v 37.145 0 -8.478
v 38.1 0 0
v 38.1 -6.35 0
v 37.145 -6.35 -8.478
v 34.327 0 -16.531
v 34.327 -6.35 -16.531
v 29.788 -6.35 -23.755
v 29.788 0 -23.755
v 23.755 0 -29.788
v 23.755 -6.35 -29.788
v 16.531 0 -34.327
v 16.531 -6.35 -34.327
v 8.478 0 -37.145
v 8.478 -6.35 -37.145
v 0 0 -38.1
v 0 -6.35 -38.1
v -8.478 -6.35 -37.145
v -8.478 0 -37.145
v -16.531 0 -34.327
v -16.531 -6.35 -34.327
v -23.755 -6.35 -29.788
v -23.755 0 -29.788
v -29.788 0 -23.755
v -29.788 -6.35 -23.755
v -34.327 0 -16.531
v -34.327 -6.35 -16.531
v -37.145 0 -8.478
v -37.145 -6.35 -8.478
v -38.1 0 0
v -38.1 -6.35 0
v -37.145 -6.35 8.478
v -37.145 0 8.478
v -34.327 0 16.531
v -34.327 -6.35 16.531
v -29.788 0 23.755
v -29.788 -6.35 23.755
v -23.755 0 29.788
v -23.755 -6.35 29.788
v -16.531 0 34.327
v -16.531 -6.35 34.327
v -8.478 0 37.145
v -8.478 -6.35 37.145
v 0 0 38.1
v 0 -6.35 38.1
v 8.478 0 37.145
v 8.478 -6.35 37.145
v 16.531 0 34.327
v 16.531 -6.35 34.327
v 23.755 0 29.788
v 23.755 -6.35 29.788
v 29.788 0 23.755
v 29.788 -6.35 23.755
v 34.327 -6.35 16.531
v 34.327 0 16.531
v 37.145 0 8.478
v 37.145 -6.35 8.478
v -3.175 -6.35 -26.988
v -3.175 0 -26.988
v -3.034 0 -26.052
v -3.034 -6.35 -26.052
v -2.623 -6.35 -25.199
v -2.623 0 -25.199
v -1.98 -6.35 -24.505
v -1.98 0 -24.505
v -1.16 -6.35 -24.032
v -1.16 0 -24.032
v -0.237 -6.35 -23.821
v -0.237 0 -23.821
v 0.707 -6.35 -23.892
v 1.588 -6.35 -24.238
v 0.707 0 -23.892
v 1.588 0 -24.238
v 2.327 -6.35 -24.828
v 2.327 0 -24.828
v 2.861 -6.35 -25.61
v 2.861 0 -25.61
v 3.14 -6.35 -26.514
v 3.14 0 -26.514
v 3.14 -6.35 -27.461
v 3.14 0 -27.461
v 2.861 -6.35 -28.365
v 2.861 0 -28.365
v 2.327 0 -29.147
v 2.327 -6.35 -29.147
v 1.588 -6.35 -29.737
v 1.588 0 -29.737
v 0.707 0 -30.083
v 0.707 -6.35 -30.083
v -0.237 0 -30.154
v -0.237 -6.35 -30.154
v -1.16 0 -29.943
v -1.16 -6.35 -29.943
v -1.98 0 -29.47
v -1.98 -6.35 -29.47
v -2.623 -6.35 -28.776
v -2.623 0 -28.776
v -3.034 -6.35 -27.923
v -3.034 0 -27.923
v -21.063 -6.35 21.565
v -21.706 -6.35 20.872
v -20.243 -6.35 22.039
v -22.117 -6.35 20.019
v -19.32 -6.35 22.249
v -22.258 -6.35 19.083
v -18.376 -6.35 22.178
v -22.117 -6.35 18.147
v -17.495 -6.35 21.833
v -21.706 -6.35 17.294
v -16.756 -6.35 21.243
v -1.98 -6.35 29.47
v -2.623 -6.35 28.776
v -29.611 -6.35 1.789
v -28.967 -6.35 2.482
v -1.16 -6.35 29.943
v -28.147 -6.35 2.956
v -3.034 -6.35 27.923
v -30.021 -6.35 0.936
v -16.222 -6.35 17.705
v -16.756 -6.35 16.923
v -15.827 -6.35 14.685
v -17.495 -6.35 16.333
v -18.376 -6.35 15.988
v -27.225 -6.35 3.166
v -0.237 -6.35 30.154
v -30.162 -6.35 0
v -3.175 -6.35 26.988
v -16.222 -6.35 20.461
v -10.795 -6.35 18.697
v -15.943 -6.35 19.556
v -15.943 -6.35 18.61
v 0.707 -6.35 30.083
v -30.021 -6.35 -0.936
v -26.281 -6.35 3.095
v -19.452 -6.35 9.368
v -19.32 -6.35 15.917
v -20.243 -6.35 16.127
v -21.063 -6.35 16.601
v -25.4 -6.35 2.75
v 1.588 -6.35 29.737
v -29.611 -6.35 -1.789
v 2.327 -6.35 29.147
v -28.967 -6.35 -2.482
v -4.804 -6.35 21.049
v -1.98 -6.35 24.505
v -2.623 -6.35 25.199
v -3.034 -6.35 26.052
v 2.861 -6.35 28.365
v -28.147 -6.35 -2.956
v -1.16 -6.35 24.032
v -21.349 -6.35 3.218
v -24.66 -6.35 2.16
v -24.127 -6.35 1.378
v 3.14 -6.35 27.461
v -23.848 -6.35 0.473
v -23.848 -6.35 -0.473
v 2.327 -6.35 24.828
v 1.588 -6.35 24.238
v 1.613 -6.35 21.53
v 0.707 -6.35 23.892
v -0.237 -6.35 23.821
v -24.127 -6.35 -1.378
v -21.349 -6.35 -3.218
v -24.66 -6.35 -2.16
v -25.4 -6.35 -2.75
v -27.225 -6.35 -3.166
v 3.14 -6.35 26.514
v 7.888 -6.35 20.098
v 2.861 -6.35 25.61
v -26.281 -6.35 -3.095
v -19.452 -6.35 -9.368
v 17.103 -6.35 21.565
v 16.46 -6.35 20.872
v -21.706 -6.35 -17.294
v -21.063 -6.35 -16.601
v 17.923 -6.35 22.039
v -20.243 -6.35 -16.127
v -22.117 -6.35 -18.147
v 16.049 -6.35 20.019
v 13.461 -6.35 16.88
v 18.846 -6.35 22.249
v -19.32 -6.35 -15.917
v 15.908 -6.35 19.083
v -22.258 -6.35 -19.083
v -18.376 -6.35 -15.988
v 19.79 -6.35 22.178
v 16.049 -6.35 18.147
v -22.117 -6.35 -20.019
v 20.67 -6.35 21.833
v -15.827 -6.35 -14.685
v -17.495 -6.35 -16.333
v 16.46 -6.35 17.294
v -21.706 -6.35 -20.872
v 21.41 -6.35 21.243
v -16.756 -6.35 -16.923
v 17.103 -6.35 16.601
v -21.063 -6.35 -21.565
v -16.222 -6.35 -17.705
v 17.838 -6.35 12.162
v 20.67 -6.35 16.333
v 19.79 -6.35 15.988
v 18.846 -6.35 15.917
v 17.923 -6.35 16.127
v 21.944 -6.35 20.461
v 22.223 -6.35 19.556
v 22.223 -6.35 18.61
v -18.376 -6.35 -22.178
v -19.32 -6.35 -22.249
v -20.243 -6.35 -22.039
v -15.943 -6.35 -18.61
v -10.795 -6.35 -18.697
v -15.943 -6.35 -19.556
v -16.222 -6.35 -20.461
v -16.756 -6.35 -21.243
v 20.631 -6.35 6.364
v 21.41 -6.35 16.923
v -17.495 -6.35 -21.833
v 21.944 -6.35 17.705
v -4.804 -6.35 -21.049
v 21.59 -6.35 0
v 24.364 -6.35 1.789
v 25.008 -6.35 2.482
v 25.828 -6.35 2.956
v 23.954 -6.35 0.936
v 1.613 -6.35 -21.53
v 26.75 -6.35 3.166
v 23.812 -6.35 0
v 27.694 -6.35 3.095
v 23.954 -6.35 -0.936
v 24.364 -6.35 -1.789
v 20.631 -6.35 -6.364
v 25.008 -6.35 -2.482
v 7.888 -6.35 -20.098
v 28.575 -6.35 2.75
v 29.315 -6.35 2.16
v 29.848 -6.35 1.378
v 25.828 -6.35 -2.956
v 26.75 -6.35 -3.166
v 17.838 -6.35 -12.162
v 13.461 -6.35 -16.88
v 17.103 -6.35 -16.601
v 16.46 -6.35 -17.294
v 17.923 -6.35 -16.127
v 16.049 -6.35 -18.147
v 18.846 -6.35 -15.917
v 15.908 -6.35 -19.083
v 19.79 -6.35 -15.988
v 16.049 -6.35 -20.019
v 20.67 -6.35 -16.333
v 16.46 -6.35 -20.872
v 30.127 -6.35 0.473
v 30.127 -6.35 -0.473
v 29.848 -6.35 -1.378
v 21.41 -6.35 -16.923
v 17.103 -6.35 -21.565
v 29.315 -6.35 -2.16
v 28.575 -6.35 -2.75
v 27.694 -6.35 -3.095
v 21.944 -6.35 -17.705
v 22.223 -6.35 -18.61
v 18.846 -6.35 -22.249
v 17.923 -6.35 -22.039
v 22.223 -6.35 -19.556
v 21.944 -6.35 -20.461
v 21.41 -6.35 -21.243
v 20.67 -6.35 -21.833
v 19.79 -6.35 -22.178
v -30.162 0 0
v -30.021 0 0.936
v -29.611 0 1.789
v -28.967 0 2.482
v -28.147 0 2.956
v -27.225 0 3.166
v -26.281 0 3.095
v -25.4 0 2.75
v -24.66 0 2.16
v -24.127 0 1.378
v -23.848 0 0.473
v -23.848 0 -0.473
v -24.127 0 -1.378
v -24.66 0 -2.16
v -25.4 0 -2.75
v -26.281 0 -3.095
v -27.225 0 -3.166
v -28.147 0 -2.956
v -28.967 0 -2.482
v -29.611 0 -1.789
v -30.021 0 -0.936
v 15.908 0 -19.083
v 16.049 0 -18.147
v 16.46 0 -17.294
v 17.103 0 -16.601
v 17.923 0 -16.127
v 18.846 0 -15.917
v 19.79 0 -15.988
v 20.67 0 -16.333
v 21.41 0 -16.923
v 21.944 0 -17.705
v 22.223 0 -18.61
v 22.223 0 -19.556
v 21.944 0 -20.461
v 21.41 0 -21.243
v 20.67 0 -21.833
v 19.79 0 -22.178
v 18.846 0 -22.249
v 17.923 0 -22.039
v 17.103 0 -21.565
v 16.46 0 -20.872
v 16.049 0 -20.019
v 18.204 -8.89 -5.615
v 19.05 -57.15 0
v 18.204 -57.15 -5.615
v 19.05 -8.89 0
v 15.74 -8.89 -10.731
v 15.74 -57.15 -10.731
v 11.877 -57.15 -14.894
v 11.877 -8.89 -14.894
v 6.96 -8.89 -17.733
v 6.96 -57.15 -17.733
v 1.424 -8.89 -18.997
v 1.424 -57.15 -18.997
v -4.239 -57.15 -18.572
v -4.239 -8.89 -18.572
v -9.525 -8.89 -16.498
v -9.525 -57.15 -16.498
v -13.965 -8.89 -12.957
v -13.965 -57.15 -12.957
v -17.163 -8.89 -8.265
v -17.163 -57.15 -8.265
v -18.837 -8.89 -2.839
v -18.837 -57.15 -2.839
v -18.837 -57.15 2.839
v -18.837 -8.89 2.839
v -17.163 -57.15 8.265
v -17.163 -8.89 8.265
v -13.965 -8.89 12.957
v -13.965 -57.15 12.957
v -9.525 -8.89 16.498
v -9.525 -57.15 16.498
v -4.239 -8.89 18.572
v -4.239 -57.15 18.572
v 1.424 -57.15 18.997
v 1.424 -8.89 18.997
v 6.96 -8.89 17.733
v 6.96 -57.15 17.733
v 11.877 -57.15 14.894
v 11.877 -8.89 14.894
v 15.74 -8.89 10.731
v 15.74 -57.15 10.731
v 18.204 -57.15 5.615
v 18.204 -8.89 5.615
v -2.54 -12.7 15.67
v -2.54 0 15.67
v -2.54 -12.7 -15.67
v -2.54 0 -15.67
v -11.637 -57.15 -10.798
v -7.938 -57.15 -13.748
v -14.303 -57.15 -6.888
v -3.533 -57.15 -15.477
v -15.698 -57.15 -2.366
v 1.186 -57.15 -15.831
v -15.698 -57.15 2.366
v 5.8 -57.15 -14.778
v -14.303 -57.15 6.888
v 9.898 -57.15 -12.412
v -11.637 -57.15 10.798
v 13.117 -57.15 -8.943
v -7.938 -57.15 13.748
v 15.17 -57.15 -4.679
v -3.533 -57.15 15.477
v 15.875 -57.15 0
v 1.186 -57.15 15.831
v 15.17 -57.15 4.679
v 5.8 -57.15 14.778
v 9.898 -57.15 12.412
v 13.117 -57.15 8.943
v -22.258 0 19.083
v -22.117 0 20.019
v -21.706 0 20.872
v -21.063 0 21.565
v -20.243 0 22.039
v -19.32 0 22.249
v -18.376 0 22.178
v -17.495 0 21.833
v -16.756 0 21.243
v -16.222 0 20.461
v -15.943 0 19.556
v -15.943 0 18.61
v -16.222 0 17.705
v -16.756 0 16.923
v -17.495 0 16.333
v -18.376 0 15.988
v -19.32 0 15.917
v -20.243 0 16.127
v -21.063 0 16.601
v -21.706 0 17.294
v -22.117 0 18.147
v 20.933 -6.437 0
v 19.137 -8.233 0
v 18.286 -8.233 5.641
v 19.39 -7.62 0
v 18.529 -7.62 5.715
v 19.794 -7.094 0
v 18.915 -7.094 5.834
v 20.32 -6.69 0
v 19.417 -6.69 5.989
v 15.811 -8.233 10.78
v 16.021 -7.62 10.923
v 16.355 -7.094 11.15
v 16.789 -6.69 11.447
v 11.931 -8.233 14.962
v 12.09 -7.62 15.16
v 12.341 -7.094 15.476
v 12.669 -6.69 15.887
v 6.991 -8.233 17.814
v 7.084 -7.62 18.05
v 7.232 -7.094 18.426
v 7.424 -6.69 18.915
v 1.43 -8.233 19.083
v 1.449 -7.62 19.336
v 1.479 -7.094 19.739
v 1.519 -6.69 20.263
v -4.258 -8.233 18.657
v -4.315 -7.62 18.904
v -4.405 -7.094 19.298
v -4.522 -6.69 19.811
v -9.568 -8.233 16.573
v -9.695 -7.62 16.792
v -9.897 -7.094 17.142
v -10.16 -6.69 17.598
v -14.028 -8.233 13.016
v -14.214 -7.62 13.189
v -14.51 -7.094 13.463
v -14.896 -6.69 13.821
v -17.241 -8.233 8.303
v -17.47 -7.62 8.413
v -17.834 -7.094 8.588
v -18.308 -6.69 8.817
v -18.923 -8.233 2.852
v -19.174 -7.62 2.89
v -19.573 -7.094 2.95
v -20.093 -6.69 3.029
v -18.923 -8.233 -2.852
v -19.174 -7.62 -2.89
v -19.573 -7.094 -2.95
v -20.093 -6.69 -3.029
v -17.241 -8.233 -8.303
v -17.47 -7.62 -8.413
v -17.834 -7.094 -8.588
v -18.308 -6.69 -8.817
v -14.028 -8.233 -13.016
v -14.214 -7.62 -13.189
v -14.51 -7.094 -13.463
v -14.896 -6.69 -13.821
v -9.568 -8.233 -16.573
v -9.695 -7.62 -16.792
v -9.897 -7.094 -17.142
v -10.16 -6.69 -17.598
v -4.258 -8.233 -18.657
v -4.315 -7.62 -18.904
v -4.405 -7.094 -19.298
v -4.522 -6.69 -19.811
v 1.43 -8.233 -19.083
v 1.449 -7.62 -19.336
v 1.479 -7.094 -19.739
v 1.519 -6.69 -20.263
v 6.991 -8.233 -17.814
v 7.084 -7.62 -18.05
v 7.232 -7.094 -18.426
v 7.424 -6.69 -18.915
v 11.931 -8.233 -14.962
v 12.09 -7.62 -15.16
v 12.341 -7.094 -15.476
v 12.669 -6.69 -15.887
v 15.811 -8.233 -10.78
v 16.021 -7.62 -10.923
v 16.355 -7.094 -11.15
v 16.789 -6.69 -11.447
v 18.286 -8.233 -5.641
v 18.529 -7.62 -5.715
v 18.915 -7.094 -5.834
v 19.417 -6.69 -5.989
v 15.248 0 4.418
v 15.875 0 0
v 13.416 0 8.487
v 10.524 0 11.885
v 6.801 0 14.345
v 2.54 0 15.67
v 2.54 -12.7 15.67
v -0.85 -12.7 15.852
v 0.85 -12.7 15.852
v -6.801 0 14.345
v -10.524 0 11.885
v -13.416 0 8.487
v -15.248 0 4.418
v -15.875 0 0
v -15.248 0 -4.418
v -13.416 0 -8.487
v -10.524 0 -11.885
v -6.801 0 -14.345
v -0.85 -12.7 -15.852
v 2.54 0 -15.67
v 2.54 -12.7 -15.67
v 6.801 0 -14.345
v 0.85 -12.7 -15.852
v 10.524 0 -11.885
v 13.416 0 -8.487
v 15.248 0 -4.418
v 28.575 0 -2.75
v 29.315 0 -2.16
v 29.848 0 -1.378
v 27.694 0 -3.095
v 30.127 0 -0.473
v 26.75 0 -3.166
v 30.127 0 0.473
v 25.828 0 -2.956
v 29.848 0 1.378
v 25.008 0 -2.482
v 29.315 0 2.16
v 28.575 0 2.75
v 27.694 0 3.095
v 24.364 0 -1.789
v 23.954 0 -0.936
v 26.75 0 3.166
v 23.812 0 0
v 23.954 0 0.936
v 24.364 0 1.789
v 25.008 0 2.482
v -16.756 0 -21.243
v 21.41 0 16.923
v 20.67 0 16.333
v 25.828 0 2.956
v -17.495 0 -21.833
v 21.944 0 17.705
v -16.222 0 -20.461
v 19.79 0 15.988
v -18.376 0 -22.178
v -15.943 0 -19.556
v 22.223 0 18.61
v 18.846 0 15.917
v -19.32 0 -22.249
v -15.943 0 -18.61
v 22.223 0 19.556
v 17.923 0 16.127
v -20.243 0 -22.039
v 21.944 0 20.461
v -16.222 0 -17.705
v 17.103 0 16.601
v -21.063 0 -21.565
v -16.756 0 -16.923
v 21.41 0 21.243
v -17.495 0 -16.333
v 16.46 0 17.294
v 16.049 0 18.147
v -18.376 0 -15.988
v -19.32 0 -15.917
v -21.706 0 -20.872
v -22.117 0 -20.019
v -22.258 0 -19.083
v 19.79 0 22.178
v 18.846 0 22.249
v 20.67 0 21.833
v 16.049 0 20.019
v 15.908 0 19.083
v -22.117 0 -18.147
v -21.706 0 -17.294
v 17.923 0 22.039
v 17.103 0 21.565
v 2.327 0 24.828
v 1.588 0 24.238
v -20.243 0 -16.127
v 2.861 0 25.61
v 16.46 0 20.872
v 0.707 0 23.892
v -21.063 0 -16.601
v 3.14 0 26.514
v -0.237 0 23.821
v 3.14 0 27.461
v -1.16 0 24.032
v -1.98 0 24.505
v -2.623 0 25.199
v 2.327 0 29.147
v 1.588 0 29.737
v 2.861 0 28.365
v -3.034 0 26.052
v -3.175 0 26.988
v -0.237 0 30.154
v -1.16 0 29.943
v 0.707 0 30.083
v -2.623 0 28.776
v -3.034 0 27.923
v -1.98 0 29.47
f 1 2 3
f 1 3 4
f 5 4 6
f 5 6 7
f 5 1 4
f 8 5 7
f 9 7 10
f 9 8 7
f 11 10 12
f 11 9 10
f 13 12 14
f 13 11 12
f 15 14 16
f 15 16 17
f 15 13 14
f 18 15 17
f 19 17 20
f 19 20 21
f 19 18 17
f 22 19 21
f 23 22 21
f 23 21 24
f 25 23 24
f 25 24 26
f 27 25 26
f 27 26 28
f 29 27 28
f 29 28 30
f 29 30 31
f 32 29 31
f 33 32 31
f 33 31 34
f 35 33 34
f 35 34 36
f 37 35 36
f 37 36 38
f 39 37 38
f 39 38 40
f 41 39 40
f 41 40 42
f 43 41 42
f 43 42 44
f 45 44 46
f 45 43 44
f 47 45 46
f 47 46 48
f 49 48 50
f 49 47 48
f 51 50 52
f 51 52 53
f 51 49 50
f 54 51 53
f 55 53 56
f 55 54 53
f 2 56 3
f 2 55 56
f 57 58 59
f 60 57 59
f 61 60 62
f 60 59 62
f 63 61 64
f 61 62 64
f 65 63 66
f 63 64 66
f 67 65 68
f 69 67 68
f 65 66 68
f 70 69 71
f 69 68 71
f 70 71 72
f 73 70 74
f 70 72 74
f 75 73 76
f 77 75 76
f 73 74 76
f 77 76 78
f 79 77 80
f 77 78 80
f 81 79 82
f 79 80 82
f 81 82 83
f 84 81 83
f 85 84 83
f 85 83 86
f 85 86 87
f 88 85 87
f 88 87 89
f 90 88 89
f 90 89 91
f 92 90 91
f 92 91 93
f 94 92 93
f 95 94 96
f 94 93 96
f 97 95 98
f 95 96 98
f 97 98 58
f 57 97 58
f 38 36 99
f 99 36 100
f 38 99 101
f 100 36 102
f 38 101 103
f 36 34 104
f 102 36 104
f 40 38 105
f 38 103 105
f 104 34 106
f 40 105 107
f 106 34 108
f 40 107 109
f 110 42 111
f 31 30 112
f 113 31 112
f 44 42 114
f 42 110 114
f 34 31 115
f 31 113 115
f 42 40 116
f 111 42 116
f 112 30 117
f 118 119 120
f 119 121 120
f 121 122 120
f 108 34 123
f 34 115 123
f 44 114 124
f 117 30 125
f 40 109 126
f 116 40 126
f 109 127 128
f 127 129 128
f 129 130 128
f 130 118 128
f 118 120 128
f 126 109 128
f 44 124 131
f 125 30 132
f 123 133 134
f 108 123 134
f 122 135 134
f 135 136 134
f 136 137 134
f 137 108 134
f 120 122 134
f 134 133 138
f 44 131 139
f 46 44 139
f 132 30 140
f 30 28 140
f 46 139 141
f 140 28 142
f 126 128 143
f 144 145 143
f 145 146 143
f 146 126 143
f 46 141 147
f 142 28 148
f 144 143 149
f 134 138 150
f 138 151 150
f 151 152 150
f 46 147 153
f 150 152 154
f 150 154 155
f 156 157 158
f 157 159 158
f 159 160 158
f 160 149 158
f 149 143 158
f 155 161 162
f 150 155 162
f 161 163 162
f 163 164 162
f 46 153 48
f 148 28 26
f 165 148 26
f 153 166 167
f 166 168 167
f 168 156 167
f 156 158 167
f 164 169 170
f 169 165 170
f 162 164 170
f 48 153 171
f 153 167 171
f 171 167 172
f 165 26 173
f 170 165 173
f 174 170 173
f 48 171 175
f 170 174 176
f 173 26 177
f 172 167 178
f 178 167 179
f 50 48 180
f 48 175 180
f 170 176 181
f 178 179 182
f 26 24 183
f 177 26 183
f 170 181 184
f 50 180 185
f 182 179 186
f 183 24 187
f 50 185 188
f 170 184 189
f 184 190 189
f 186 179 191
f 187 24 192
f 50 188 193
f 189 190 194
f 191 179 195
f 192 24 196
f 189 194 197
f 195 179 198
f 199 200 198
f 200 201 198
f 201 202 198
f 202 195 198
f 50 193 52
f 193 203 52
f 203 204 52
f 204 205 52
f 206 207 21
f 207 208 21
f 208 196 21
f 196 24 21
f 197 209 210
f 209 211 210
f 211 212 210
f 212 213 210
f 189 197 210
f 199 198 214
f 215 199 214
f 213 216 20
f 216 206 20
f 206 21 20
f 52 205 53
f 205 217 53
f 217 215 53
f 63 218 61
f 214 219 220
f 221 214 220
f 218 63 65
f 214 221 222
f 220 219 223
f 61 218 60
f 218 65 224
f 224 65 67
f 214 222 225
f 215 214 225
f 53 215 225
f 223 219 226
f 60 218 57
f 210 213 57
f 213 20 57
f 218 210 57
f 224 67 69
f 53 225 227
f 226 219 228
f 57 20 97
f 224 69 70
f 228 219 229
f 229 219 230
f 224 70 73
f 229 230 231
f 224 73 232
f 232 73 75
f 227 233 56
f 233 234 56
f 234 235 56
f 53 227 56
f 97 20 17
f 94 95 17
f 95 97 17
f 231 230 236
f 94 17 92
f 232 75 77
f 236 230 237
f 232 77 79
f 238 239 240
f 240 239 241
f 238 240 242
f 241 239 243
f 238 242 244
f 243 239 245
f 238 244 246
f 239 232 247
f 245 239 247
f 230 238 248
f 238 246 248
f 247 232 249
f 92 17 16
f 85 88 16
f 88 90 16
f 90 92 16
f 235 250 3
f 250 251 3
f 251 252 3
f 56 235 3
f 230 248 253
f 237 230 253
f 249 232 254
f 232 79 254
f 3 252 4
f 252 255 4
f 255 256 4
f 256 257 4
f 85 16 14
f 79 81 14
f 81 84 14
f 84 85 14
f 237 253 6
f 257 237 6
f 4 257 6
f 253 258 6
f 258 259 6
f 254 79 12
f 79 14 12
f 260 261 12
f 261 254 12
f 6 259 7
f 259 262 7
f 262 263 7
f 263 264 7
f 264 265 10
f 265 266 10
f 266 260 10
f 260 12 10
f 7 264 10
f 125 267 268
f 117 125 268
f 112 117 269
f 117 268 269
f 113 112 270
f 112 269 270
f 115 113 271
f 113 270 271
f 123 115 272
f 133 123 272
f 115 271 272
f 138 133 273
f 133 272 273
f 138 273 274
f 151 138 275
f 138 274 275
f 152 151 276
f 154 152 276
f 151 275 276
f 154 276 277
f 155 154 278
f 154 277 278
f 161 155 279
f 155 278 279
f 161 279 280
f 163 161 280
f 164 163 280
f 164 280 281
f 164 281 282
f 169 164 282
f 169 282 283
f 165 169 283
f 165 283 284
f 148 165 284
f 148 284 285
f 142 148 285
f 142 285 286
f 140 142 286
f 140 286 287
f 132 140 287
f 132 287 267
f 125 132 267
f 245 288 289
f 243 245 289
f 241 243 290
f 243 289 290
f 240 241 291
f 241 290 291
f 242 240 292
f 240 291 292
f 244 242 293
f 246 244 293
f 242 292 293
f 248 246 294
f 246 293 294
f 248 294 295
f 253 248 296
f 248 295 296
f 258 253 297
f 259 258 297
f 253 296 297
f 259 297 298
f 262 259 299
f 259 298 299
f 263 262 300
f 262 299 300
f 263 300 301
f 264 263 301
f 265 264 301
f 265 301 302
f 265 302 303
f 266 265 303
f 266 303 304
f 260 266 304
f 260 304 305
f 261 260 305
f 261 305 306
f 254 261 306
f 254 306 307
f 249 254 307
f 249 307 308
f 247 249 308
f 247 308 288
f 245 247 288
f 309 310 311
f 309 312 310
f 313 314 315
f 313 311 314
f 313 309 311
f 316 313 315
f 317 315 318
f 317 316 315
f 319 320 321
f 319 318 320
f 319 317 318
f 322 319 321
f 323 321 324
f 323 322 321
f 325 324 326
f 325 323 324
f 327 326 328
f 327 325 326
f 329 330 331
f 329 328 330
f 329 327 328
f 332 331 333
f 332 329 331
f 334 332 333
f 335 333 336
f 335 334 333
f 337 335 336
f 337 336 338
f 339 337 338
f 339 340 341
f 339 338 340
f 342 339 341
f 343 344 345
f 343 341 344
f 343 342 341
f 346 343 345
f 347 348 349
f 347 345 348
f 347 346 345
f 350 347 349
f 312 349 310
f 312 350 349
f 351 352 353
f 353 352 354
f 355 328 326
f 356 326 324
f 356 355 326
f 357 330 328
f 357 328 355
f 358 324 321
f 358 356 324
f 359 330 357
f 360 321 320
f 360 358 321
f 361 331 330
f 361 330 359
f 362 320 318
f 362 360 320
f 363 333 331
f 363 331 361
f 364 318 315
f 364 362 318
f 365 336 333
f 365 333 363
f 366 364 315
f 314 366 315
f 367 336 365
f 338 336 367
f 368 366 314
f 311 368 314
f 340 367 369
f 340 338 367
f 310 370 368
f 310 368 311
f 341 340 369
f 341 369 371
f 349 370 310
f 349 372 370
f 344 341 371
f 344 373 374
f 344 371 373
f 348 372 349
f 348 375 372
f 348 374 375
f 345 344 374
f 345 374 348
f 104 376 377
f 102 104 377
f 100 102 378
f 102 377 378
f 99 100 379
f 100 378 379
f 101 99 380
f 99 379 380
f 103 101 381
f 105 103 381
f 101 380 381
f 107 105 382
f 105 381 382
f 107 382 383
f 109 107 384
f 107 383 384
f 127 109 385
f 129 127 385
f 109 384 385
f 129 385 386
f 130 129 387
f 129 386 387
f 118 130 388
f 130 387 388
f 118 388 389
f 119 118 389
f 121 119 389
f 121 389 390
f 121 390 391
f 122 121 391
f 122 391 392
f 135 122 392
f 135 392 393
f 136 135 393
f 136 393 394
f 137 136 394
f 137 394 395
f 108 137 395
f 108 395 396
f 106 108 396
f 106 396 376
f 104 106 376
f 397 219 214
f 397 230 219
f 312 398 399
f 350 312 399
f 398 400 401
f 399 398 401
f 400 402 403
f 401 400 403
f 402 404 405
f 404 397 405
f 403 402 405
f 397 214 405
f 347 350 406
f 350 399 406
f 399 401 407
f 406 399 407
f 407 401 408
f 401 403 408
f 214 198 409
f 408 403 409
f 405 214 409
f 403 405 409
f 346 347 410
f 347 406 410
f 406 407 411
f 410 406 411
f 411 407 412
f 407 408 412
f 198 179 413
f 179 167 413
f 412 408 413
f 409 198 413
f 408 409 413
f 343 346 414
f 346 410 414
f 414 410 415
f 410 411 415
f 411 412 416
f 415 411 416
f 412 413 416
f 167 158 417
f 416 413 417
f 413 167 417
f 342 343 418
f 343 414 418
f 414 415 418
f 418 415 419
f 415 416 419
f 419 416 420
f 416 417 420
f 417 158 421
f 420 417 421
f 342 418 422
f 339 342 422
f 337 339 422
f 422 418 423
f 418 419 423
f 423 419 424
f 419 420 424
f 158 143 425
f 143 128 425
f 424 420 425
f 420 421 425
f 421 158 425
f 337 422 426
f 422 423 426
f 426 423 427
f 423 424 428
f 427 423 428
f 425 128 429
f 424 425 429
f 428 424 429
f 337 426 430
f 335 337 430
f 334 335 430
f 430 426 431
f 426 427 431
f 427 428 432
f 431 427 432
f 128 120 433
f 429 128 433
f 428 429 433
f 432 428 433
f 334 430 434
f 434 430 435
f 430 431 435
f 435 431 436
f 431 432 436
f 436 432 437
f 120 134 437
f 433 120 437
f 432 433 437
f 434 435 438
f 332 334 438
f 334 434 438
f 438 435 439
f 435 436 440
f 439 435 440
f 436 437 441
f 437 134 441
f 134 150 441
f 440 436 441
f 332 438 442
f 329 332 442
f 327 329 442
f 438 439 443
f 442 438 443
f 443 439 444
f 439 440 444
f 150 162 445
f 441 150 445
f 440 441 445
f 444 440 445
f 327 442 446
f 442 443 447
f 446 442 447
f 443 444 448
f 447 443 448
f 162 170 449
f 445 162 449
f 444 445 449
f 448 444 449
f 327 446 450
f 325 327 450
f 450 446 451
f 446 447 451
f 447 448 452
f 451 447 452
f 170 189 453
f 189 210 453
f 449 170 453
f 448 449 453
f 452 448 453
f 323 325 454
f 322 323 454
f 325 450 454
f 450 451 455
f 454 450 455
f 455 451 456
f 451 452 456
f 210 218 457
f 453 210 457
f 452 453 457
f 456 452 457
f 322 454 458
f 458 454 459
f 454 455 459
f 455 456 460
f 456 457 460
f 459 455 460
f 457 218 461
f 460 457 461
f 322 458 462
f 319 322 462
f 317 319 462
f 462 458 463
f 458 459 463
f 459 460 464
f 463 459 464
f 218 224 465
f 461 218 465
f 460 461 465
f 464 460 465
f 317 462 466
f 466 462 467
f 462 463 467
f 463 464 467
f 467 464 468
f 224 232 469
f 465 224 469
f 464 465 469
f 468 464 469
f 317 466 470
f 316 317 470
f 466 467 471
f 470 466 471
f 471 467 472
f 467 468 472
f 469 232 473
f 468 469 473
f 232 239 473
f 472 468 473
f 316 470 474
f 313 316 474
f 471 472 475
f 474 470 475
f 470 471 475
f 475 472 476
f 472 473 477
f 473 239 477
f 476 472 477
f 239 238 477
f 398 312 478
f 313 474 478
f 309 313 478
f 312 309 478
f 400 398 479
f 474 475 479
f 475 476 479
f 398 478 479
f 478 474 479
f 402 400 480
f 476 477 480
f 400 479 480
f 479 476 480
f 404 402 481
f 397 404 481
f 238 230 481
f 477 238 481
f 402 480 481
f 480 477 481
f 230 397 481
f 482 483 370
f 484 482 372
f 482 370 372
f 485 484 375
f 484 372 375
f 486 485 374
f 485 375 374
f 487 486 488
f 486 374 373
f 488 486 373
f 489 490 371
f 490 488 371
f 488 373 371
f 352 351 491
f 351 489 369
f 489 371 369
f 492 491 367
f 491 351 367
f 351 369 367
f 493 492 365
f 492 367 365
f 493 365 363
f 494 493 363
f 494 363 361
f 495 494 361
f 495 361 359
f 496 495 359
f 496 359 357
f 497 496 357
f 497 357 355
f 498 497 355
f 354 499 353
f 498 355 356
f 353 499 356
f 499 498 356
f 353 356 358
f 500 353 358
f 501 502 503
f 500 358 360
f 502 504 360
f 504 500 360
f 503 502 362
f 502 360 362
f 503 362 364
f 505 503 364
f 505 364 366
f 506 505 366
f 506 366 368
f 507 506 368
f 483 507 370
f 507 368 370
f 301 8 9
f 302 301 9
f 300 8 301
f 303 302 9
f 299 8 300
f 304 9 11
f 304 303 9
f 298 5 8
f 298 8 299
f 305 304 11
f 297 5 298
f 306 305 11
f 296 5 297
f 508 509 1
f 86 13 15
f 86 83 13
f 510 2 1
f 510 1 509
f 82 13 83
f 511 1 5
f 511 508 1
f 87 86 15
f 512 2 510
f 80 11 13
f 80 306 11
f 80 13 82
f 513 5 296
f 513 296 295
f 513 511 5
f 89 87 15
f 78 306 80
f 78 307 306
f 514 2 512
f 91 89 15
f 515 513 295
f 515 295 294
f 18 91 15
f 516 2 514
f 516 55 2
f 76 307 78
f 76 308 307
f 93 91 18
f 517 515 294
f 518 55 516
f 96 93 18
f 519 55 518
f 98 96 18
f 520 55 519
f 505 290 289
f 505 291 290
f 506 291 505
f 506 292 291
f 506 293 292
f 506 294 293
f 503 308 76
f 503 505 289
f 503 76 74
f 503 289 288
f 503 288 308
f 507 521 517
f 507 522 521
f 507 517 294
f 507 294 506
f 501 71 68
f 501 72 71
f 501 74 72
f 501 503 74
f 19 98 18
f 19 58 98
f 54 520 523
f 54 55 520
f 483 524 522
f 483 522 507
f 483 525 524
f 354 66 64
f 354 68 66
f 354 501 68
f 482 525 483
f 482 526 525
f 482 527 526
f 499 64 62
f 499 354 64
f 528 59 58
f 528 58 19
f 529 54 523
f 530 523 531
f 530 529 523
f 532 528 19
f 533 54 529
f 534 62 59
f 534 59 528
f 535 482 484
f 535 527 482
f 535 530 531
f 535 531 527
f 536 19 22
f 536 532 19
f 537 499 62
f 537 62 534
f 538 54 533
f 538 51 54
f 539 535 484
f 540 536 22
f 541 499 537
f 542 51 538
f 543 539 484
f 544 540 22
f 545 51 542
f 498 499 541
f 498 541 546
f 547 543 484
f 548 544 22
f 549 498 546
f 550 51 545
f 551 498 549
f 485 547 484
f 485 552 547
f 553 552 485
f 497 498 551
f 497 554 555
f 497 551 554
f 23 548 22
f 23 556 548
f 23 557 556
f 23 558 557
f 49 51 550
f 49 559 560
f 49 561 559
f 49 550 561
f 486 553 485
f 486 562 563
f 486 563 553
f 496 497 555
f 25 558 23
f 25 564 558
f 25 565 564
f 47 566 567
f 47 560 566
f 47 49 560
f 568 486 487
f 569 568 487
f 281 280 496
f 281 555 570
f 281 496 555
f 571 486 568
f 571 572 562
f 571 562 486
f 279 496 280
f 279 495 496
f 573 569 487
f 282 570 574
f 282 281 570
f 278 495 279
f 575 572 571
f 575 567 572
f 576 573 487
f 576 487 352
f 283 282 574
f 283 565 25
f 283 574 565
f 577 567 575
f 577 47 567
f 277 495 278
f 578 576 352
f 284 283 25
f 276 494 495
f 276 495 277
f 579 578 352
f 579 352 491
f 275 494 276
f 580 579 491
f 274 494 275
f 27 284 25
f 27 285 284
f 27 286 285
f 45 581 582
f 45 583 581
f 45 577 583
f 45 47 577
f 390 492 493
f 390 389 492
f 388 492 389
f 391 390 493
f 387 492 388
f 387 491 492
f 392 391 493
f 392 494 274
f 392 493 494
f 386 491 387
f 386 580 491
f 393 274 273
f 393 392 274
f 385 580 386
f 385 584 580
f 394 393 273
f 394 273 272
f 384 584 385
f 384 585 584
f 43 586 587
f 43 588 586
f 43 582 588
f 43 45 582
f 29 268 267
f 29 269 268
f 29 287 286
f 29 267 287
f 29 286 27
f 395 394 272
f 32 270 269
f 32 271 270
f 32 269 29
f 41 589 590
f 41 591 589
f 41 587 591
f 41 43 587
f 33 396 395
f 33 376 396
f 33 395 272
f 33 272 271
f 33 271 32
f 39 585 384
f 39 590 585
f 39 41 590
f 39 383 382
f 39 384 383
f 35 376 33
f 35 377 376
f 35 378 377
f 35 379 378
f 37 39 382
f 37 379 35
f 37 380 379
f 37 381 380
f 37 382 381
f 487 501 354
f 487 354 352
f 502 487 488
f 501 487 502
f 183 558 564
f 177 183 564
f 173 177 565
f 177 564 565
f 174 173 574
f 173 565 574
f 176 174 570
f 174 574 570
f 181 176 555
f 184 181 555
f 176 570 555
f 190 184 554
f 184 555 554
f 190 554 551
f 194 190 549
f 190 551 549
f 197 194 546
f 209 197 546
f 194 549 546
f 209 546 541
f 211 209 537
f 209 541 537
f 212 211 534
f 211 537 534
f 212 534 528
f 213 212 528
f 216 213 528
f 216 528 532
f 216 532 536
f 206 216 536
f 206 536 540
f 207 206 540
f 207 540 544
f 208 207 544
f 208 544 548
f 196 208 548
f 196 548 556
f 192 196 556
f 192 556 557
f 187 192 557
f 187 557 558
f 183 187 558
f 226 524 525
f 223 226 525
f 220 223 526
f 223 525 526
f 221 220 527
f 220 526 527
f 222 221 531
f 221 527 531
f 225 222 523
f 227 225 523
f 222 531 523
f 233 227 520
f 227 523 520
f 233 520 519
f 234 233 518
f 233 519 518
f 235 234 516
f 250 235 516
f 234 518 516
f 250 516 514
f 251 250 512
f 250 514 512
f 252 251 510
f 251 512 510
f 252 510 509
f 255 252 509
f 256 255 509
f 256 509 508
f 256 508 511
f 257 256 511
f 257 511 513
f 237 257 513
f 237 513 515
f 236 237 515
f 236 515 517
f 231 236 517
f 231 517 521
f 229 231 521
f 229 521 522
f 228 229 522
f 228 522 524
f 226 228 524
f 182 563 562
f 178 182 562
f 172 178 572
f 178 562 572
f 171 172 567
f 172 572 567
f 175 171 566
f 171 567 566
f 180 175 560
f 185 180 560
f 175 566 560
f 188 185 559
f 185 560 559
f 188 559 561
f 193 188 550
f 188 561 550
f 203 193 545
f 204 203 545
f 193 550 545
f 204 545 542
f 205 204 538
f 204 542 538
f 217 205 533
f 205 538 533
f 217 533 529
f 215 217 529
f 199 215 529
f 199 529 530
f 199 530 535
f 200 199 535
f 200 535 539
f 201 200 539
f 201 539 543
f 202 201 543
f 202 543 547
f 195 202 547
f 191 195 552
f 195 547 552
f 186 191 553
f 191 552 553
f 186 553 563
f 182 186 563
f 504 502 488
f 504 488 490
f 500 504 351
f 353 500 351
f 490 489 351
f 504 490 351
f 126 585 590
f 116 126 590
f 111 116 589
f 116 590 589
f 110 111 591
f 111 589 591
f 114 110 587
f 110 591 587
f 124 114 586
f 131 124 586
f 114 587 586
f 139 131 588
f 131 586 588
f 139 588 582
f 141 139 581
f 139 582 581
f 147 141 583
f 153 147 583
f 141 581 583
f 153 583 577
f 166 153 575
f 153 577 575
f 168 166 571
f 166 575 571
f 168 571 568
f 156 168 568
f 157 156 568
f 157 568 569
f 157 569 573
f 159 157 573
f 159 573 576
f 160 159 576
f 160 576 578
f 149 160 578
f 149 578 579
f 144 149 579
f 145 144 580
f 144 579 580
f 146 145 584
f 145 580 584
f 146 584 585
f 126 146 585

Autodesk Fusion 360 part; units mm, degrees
sketch "Sketch1" plane through (0, 0, 0) normal (0, 1, 0) x (1, 0, 0)
  circle A0 centre (0, 0) radius 38.1
  dimension "d1" = 76.2
extrude "Extrude1" add sketch "Sketch1" against normal blind 6.35
sketch "Sketch2" plane through (0, -6.35, 0) normal (0, -1, 0) x (1, 0, 0)
  circle A0 centre (0, 0) radius 38.1
  circle A1 centre (0, 0) radius 15.875
  dimension "d4" = 31.75
extrude "Extrude2" cut sketch "Sketch2" against normal blind 83.82 contours A1
sketch "Sketch3" plane through (0, -6.35, 0) normal (0, -1, 0) x (1, 0, 0)
  circle A0 centre (0, 0) radius 15.875
  circle A1 centre (0, 0) radius 38.1
  circle A2 centre (0, 0) radius 15.875
  circle A3 centre (0, 0) radius 19.05
  dimension "d7" = 31.75
  dimension "d8" = 38.1
extrude "Extrude3" add sketch "Sketch3" along normal blind 50.8 contours A3
fillet "Fillet1" radius 2.54 1 edges at (-17.7608, -6.35, 6.8888)
sketch "Sketch4" plane through (0, 0, 0) normal (0, 1, 0) x (-1, 0, 0)
  circle A0 centre (0, 0) radius 15.875
  circle A1 centre (0, 0) radius 38.1
  circle A2 centre (0, 26.9875) radius 3.175
  circle A3 centre (-19.083, 19.083) radius 3.175
  circle A4 centre (-26.9875, 0) radius 3.175
  circle A5 centre (-19.083, -19.083) radius 3.175
  circle A6 centre (0, -26.9875) radius 3.175
  circle A7 centre (19.083, -19.083) radius 3.175
  circle A8 centre (26.9875, 0) radius 3.175
  circle A9 centre (19.083, 19.083) radius 3.175
  dimension "d13" = 6.35
  dimension "d15" = 360
extrude "Extrude4" cut sketch "Sketch4" against normal blind 76.2 contours A2 | A3 | A4 | A5 | A6 | A7 | A8 | A9
sketch "Sketch5" plane through (0, 0, 0) normal (0, 1, 0) x (-1, 0, 0)
  circle A0 centre (0, 26.9875) radius 3.175
  circle A1 centre (0, -26.9875) radius 3.175
  circle A2 centre (19.083, -19.083) radius 3.175
  circle A3 centre (-19.083, 19.083) radius 3.175
  circle A4 centre (19.083, 19.083) radius 3.175
  circle A5 centre (-19.083, -19.083) radius 3.175
  circle A6 centre (26.9875, 0) radius 3.175
  circle A7 centre (-26.9875, 0) radius 3.175
  circle A8 centre (0, 0) radius 15.875
  circle A9 centre (0, 0) radius 38.1
  line L0 (-2.54, 15.875) -> (-2.54, -15.875)
  line L1 (2.54, 15.875) -> (2.54, -15.875)
  arc A10 (-2.54, -15.6705) -> (2.54, -15.6705) centre (0, 0) ccw
  arc A11 (2.54, 15.6705) -> (-2.54, 15.6705) centre (0, 0) ccw
extrude "Extrude5" add sketch "Sketch5" against normal blind 12.7 contours A8 L0 L1 A10 A11
